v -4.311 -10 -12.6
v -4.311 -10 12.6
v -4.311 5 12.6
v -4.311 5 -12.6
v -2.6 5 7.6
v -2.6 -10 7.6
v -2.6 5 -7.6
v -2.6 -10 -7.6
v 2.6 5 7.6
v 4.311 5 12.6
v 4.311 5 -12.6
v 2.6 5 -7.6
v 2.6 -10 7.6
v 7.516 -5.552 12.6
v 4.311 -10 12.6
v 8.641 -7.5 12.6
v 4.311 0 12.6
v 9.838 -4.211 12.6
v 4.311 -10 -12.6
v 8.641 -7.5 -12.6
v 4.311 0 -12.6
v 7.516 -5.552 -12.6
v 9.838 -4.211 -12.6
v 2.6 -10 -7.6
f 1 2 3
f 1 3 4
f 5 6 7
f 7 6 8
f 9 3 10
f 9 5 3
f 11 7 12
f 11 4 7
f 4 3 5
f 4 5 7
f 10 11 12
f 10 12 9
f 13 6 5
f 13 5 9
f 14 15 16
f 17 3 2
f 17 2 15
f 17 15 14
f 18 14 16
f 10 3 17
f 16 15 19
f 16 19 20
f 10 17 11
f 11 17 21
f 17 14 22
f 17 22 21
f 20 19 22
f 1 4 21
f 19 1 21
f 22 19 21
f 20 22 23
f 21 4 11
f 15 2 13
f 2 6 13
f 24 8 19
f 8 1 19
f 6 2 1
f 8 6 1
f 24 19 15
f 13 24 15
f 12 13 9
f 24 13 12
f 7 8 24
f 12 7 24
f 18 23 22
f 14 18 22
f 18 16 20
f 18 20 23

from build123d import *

# Parameters (mm, degrees)
EXTRUDE_1_DEPTH      = 5
EXTRUDE_1_DEPTH_BACK = 10
SKETCH_1_W           = 8.621052632
SKETCH_1_H           = 25.2
SKETCH_1_W_2         = 5.2
SKETCH_1_H_2         = 15.2
EXTRUDE_2_DEPTH      = 25.2


with BuildPart() as part:
    # 草图1 → 凸台-拉伸1 (new, two sides: drawn at the far end of the back side and taken through both)
    with BuildSketch(Plane(origin=(0, 0, 0), x_dir=(1, 0, 0), z_dir=(0, 1, 0)).offset(-EXTRUDE_1_DEPTH_BACK)):
        Rectangle(SKETCH_1_W, SKETCH_1_H)
        Rectangle(SKETCH_1_W_2, SKETCH_1_H_2, mode=Mode.SUBTRACT)
    extrude(amount=EXTRUDE_1_DEPTH + EXTRUDE_1_DEPTH_BACK)

    # 草图2 → 凸台-拉伸2 (add)
    with BuildSketch(Plane.XY.offset(12.6)):
        Polygon((8.640653335, -7.5), (9.837723836, -4.211075827), (7.515775018, -5.551653603), (4.310526316, 0), (4.310526316, -10), align=None)
    extrude(amount=-EXTRUDE_2_DEPTH)


solid = part.part
